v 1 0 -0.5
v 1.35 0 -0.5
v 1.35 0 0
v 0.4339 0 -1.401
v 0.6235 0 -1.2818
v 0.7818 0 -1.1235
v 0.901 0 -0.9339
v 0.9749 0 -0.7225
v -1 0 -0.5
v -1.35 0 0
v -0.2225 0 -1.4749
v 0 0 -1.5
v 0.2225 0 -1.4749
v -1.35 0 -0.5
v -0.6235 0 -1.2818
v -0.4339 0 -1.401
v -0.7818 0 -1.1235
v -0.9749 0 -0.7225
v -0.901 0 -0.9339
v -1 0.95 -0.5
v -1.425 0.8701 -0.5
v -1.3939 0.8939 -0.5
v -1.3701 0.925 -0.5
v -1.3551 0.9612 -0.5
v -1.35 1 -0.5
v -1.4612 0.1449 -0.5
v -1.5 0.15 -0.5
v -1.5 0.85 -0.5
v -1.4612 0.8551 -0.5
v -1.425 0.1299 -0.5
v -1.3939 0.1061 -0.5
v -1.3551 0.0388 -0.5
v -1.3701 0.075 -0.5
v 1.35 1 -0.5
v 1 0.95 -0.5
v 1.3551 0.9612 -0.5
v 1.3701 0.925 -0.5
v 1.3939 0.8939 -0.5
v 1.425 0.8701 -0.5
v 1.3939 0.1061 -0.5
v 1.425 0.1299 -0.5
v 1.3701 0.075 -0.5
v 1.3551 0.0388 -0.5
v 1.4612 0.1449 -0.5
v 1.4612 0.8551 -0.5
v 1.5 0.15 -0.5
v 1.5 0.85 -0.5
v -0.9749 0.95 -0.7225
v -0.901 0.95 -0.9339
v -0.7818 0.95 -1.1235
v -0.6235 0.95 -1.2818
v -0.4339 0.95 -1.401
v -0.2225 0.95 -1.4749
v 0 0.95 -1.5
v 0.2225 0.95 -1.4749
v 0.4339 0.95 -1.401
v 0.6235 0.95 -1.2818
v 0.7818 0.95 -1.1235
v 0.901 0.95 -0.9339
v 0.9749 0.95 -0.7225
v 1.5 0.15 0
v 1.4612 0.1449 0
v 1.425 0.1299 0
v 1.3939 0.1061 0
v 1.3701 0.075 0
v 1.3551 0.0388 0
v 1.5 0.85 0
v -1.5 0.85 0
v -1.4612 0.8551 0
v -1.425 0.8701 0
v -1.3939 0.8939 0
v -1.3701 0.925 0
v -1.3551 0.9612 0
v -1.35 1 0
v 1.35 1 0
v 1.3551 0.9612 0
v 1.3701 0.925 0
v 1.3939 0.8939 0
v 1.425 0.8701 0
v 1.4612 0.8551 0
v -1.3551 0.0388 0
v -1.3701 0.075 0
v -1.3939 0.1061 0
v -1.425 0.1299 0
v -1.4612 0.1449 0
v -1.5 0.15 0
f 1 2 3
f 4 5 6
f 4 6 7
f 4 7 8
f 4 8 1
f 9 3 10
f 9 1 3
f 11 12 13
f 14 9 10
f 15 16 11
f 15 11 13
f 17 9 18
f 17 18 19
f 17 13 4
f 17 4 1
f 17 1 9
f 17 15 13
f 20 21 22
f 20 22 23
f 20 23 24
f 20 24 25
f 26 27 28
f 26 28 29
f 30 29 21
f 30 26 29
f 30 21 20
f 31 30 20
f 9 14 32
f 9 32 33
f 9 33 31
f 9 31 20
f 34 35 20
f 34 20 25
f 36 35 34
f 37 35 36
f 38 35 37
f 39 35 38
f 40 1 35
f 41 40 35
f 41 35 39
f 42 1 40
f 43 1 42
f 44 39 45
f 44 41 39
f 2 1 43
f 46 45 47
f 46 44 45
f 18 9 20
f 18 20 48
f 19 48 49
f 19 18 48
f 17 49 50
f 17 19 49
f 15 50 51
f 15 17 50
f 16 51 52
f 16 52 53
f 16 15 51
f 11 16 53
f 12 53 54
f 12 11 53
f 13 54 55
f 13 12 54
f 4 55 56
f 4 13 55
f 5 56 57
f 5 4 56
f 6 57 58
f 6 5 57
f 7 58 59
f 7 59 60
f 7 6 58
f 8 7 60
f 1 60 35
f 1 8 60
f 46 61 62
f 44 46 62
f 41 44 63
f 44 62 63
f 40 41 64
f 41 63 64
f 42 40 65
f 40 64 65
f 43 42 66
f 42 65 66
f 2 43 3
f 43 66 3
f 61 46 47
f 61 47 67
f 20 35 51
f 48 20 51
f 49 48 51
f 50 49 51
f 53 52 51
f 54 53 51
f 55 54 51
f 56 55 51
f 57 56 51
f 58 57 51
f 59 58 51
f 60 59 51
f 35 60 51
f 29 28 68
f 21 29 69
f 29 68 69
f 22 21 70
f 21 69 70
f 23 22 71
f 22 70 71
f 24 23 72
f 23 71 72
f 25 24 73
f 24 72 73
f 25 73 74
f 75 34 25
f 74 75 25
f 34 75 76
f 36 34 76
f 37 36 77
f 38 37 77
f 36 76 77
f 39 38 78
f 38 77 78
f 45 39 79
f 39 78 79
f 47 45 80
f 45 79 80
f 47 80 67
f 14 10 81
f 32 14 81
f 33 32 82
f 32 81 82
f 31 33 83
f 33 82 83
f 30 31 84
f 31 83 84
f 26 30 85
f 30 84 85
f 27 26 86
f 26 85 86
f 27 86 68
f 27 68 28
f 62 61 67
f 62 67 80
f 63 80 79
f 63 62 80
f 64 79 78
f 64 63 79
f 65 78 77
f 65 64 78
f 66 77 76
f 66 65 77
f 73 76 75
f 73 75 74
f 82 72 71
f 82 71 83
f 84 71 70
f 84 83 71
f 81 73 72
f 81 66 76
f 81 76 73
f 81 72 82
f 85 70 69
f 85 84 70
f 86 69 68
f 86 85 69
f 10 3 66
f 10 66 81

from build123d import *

# Parameters (mm, degrees)
BOSS_EXTRUDE1_DEPTH = 1
SKETCH2_R           = 0.15
CUT_EXTRUDE1_DEPTH  = 2.5
CUT_EXTRUDE2_DEPTH  = 0.05


with BuildPart() as part:
    # Sketch1 → Boss-Extrude1 (new body)
    with BuildSketch(Plane(origin=(0, 0, 0), x_dir=(1, 0, 0), z_dir=(0, 1, 0))):
        with BuildLine():
            Line((1, 0.5), (1.5, 0.5))
            Line((1.5, 0.5), (1.5, 0))
            Line((1.5, 0), (-1.5, 0))
            Line((-1.5, 0), (-1.5, 0.5))
            Line((-1.5, 0.5), (-1, 0.5))
            ThreePointArc((-1, 0.5), (0, 1.5), (1, 0.5))
        make_face()
    extrude(amount=BOSS_EXTRUDE1_DEPTH)

    # Sketch2 → Cut-Extrude1 (cut, through all)
    with BuildSketch(Plane.XY):
        with Locations((1.5, 1)):
            Circle(SKETCH2_R)
        with Locations((1.5, 0)):
            Circle(SKETCH2_R)
        with Locations((-1.5, 1)):
            Circle(SKETCH2_R)
        with Locations((-1.5, 0)):
            Circle(SKETCH2_R)
    extrude(amount=-CUT_EXTRUDE1_DEPTH, mode=Mode.SUBTRACT)

    # Sketch4 → Cut-Extrude2 (cut)
    with BuildSketch(Plane(origin=(0, 1, 0), x_dir=(1, 0, 0), z_dir=(0, 1, 0))):
        with BuildLine():
            Line((1, 0.5), (-1, 0.5))
            ThreePointArc((-1, 0.5), (0, 1.5), (1, 0.5))
        make_face()
    extrude(amount=-CUT_EXTRUDE2_DEPTH, mode=Mode.SUBTRACT)


solid = part.part
